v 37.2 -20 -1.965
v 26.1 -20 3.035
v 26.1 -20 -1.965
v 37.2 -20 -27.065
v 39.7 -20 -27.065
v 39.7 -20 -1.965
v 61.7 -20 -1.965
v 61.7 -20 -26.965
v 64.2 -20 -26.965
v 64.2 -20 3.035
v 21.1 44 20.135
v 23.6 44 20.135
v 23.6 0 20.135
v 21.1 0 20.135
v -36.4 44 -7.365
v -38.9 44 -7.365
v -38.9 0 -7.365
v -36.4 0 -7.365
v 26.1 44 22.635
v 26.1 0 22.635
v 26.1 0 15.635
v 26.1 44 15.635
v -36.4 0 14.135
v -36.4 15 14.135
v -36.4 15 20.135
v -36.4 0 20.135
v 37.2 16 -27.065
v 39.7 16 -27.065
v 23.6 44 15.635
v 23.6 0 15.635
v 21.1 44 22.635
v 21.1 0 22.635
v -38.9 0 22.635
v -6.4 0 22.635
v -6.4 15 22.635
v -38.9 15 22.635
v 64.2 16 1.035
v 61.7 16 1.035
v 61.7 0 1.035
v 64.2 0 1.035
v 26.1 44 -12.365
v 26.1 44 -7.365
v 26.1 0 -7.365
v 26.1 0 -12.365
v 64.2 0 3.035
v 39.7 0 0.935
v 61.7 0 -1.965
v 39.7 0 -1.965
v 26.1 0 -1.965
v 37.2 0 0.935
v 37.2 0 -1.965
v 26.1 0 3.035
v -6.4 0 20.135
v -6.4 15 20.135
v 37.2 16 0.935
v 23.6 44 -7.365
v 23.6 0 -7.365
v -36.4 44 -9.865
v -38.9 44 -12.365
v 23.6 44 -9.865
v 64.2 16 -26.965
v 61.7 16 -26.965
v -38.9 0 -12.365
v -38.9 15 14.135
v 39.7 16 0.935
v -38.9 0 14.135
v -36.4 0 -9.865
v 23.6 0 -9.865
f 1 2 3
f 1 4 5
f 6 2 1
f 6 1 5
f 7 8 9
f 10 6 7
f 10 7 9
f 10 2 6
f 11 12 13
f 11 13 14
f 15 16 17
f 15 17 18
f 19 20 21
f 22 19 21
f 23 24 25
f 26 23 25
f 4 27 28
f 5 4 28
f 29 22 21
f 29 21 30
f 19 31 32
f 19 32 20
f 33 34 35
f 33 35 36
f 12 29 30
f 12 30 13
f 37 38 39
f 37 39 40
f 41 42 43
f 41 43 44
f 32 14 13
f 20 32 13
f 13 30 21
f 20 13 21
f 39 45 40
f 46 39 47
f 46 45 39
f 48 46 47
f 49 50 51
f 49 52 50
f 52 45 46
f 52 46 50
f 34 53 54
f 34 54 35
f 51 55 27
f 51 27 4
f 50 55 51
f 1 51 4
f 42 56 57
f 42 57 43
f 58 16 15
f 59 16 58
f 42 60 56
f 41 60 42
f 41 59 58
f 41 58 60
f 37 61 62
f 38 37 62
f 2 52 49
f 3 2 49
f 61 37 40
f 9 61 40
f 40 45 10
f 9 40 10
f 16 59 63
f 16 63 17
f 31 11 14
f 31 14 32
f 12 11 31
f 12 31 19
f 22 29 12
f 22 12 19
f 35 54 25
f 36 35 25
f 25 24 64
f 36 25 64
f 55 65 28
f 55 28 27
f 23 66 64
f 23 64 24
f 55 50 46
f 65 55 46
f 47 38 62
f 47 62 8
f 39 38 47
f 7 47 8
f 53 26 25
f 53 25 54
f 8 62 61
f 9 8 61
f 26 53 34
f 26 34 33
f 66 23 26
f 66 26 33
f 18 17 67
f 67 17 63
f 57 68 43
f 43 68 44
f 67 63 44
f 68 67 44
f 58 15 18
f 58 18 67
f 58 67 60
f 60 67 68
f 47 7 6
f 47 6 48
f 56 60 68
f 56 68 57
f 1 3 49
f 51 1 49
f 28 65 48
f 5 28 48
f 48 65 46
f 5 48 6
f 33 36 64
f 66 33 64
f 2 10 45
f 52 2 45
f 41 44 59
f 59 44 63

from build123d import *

# Parameters (mm, degrees)
BOSS_EXTRUDE2_DEPTH      = 44
BOSS_EXTRUDE2_2_DEPTH    = 44
BOSS_EXTRUDE3_DEPTH      = 15
SKETCH17_W               = 5
SKETCH17_H               = 20
BOSS_EXTRUDE4_DEPTH      = 38.1
BOSS_EXTRUDE5_DEPTH      = 25
BOSS_EXTRUDE5_DEPTH_BACK = 3
BOSS_EXTRUDE6_DEPTH      = 25.1
BOSS_EXTRUDE6_DEPTH_BACK = 2.9


with BuildPart() as part:
    # Sketch11 → Boss-Extrude2 (new body)
    with BuildSketch(Plane(origin=(0, 0, 0), x_dir=(1, 0, 0), z_dir=(0, 1, 0))):
        Polygon((-38.899641352, 12.364528858), (-38.899641352, 7.364528858), (-36.399641352, 7.364528858), (-36.399641352, 9.864528858), (23.600358648, 9.864528858), (23.600358648, 7.364528858), (26.100358648, 7.364528858), (26.100358648, 12.364528858), align=None)
    extrude(amount=BOSS_EXTRUDE2_DEPTH)


with BuildPart() as body_2:
    # Sketch11 → Boss-Extrude2 2 (new body)
    with BuildSketch(Plane(origin=(0, 0, 0), x_dir=(1, 0, 0), z_dir=(0, 1, 0))):
        Polygon((26.100358648, -22.635471142), (26.100358648, -15.635471142), (23.600358648, -15.635471142), (23.600358648, -20.135471142), (21.100358648, -20.135471142), (21.100358648, -22.635471142), align=None)
    extrude(amount=BOSS_EXTRUDE2_2_DEPTH)


with BuildPart() as body_3:
    # Sketch13 → Boss-Extrude3 (new body)
    with BuildSketch(Plane(origin=(0, 0, 0), x_dir=(1, 0, 0), z_dir=(0, 1, 0))):
        Polygon((-38.899641352, -14.135471142), (-36.399641352, -14.135471142), (-36.399641352, -20.135471142), (-6.399641352, -20.135471142), (-6.399641352, -22.635471142), (-38.899641352, -22.635471142), align=None)
    extrude(amount=BOSS_EXTRUDE3_DEPTH)


with BuildPart() as body_4:
    # Sketch17 → Boss-Extrude4 (new body)
    with BuildSketch(Plane(origin=(26.100358648, 0, 0), x_dir=(0, 0, -1), z_dir=(1, 0, 0))):
        with Locations((-0.535471142, -10)):
            Rectangle(SKETCH17_W, SKETCH17_H)
    extrude(amount=BOSS_EXTRUDE4_DEPTH)

    # Sketch19 → Boss-Extrude5 (add, two sides: drawn at the far end of the back side and taken through both)
    with BuildSketch(Plane(origin=(0, 0, -1.964528858), x_dir=(-1, 0, 0), z_dir=(0, 0, -1)).offset(-BOSS_EXTRUDE5_DEPTH_BACK)):
        Polygon((-64.200358648, 0), (-64.200358648, 16), (-61.700358648, 16), (-61.700358648, -20), (-64.200358648, -20), align=None)
    extrude(amount=BOSS_EXTRUDE5_DEPTH + BOSS_EXTRUDE5_DEPTH_BACK)

    # Sketch24 → Boss-Extrude6 (add, two sides: drawn at the far end of the back side and taken through both)
    with BuildSketch(Plane(origin=(0, 0, -1.964528858), x_dir=(-1, 0, 0), z_dir=(0, 0, -1)).offset(-BOSS_EXTRUDE6_DEPTH_BACK)):
        Polygon((-39.700358648, 0), (-39.700358648, 16), (-37.200358648, 16), (-37.200358648, -20), (-39.700358648, -20), align=None)
    extrude(amount=BOSS_EXTRUDE6_DEPTH + BOSS_EXTRUDE6_DEPTH_BACK)


solid = Compound([part.part, body_2.part, body_3.part, body_4.part])
